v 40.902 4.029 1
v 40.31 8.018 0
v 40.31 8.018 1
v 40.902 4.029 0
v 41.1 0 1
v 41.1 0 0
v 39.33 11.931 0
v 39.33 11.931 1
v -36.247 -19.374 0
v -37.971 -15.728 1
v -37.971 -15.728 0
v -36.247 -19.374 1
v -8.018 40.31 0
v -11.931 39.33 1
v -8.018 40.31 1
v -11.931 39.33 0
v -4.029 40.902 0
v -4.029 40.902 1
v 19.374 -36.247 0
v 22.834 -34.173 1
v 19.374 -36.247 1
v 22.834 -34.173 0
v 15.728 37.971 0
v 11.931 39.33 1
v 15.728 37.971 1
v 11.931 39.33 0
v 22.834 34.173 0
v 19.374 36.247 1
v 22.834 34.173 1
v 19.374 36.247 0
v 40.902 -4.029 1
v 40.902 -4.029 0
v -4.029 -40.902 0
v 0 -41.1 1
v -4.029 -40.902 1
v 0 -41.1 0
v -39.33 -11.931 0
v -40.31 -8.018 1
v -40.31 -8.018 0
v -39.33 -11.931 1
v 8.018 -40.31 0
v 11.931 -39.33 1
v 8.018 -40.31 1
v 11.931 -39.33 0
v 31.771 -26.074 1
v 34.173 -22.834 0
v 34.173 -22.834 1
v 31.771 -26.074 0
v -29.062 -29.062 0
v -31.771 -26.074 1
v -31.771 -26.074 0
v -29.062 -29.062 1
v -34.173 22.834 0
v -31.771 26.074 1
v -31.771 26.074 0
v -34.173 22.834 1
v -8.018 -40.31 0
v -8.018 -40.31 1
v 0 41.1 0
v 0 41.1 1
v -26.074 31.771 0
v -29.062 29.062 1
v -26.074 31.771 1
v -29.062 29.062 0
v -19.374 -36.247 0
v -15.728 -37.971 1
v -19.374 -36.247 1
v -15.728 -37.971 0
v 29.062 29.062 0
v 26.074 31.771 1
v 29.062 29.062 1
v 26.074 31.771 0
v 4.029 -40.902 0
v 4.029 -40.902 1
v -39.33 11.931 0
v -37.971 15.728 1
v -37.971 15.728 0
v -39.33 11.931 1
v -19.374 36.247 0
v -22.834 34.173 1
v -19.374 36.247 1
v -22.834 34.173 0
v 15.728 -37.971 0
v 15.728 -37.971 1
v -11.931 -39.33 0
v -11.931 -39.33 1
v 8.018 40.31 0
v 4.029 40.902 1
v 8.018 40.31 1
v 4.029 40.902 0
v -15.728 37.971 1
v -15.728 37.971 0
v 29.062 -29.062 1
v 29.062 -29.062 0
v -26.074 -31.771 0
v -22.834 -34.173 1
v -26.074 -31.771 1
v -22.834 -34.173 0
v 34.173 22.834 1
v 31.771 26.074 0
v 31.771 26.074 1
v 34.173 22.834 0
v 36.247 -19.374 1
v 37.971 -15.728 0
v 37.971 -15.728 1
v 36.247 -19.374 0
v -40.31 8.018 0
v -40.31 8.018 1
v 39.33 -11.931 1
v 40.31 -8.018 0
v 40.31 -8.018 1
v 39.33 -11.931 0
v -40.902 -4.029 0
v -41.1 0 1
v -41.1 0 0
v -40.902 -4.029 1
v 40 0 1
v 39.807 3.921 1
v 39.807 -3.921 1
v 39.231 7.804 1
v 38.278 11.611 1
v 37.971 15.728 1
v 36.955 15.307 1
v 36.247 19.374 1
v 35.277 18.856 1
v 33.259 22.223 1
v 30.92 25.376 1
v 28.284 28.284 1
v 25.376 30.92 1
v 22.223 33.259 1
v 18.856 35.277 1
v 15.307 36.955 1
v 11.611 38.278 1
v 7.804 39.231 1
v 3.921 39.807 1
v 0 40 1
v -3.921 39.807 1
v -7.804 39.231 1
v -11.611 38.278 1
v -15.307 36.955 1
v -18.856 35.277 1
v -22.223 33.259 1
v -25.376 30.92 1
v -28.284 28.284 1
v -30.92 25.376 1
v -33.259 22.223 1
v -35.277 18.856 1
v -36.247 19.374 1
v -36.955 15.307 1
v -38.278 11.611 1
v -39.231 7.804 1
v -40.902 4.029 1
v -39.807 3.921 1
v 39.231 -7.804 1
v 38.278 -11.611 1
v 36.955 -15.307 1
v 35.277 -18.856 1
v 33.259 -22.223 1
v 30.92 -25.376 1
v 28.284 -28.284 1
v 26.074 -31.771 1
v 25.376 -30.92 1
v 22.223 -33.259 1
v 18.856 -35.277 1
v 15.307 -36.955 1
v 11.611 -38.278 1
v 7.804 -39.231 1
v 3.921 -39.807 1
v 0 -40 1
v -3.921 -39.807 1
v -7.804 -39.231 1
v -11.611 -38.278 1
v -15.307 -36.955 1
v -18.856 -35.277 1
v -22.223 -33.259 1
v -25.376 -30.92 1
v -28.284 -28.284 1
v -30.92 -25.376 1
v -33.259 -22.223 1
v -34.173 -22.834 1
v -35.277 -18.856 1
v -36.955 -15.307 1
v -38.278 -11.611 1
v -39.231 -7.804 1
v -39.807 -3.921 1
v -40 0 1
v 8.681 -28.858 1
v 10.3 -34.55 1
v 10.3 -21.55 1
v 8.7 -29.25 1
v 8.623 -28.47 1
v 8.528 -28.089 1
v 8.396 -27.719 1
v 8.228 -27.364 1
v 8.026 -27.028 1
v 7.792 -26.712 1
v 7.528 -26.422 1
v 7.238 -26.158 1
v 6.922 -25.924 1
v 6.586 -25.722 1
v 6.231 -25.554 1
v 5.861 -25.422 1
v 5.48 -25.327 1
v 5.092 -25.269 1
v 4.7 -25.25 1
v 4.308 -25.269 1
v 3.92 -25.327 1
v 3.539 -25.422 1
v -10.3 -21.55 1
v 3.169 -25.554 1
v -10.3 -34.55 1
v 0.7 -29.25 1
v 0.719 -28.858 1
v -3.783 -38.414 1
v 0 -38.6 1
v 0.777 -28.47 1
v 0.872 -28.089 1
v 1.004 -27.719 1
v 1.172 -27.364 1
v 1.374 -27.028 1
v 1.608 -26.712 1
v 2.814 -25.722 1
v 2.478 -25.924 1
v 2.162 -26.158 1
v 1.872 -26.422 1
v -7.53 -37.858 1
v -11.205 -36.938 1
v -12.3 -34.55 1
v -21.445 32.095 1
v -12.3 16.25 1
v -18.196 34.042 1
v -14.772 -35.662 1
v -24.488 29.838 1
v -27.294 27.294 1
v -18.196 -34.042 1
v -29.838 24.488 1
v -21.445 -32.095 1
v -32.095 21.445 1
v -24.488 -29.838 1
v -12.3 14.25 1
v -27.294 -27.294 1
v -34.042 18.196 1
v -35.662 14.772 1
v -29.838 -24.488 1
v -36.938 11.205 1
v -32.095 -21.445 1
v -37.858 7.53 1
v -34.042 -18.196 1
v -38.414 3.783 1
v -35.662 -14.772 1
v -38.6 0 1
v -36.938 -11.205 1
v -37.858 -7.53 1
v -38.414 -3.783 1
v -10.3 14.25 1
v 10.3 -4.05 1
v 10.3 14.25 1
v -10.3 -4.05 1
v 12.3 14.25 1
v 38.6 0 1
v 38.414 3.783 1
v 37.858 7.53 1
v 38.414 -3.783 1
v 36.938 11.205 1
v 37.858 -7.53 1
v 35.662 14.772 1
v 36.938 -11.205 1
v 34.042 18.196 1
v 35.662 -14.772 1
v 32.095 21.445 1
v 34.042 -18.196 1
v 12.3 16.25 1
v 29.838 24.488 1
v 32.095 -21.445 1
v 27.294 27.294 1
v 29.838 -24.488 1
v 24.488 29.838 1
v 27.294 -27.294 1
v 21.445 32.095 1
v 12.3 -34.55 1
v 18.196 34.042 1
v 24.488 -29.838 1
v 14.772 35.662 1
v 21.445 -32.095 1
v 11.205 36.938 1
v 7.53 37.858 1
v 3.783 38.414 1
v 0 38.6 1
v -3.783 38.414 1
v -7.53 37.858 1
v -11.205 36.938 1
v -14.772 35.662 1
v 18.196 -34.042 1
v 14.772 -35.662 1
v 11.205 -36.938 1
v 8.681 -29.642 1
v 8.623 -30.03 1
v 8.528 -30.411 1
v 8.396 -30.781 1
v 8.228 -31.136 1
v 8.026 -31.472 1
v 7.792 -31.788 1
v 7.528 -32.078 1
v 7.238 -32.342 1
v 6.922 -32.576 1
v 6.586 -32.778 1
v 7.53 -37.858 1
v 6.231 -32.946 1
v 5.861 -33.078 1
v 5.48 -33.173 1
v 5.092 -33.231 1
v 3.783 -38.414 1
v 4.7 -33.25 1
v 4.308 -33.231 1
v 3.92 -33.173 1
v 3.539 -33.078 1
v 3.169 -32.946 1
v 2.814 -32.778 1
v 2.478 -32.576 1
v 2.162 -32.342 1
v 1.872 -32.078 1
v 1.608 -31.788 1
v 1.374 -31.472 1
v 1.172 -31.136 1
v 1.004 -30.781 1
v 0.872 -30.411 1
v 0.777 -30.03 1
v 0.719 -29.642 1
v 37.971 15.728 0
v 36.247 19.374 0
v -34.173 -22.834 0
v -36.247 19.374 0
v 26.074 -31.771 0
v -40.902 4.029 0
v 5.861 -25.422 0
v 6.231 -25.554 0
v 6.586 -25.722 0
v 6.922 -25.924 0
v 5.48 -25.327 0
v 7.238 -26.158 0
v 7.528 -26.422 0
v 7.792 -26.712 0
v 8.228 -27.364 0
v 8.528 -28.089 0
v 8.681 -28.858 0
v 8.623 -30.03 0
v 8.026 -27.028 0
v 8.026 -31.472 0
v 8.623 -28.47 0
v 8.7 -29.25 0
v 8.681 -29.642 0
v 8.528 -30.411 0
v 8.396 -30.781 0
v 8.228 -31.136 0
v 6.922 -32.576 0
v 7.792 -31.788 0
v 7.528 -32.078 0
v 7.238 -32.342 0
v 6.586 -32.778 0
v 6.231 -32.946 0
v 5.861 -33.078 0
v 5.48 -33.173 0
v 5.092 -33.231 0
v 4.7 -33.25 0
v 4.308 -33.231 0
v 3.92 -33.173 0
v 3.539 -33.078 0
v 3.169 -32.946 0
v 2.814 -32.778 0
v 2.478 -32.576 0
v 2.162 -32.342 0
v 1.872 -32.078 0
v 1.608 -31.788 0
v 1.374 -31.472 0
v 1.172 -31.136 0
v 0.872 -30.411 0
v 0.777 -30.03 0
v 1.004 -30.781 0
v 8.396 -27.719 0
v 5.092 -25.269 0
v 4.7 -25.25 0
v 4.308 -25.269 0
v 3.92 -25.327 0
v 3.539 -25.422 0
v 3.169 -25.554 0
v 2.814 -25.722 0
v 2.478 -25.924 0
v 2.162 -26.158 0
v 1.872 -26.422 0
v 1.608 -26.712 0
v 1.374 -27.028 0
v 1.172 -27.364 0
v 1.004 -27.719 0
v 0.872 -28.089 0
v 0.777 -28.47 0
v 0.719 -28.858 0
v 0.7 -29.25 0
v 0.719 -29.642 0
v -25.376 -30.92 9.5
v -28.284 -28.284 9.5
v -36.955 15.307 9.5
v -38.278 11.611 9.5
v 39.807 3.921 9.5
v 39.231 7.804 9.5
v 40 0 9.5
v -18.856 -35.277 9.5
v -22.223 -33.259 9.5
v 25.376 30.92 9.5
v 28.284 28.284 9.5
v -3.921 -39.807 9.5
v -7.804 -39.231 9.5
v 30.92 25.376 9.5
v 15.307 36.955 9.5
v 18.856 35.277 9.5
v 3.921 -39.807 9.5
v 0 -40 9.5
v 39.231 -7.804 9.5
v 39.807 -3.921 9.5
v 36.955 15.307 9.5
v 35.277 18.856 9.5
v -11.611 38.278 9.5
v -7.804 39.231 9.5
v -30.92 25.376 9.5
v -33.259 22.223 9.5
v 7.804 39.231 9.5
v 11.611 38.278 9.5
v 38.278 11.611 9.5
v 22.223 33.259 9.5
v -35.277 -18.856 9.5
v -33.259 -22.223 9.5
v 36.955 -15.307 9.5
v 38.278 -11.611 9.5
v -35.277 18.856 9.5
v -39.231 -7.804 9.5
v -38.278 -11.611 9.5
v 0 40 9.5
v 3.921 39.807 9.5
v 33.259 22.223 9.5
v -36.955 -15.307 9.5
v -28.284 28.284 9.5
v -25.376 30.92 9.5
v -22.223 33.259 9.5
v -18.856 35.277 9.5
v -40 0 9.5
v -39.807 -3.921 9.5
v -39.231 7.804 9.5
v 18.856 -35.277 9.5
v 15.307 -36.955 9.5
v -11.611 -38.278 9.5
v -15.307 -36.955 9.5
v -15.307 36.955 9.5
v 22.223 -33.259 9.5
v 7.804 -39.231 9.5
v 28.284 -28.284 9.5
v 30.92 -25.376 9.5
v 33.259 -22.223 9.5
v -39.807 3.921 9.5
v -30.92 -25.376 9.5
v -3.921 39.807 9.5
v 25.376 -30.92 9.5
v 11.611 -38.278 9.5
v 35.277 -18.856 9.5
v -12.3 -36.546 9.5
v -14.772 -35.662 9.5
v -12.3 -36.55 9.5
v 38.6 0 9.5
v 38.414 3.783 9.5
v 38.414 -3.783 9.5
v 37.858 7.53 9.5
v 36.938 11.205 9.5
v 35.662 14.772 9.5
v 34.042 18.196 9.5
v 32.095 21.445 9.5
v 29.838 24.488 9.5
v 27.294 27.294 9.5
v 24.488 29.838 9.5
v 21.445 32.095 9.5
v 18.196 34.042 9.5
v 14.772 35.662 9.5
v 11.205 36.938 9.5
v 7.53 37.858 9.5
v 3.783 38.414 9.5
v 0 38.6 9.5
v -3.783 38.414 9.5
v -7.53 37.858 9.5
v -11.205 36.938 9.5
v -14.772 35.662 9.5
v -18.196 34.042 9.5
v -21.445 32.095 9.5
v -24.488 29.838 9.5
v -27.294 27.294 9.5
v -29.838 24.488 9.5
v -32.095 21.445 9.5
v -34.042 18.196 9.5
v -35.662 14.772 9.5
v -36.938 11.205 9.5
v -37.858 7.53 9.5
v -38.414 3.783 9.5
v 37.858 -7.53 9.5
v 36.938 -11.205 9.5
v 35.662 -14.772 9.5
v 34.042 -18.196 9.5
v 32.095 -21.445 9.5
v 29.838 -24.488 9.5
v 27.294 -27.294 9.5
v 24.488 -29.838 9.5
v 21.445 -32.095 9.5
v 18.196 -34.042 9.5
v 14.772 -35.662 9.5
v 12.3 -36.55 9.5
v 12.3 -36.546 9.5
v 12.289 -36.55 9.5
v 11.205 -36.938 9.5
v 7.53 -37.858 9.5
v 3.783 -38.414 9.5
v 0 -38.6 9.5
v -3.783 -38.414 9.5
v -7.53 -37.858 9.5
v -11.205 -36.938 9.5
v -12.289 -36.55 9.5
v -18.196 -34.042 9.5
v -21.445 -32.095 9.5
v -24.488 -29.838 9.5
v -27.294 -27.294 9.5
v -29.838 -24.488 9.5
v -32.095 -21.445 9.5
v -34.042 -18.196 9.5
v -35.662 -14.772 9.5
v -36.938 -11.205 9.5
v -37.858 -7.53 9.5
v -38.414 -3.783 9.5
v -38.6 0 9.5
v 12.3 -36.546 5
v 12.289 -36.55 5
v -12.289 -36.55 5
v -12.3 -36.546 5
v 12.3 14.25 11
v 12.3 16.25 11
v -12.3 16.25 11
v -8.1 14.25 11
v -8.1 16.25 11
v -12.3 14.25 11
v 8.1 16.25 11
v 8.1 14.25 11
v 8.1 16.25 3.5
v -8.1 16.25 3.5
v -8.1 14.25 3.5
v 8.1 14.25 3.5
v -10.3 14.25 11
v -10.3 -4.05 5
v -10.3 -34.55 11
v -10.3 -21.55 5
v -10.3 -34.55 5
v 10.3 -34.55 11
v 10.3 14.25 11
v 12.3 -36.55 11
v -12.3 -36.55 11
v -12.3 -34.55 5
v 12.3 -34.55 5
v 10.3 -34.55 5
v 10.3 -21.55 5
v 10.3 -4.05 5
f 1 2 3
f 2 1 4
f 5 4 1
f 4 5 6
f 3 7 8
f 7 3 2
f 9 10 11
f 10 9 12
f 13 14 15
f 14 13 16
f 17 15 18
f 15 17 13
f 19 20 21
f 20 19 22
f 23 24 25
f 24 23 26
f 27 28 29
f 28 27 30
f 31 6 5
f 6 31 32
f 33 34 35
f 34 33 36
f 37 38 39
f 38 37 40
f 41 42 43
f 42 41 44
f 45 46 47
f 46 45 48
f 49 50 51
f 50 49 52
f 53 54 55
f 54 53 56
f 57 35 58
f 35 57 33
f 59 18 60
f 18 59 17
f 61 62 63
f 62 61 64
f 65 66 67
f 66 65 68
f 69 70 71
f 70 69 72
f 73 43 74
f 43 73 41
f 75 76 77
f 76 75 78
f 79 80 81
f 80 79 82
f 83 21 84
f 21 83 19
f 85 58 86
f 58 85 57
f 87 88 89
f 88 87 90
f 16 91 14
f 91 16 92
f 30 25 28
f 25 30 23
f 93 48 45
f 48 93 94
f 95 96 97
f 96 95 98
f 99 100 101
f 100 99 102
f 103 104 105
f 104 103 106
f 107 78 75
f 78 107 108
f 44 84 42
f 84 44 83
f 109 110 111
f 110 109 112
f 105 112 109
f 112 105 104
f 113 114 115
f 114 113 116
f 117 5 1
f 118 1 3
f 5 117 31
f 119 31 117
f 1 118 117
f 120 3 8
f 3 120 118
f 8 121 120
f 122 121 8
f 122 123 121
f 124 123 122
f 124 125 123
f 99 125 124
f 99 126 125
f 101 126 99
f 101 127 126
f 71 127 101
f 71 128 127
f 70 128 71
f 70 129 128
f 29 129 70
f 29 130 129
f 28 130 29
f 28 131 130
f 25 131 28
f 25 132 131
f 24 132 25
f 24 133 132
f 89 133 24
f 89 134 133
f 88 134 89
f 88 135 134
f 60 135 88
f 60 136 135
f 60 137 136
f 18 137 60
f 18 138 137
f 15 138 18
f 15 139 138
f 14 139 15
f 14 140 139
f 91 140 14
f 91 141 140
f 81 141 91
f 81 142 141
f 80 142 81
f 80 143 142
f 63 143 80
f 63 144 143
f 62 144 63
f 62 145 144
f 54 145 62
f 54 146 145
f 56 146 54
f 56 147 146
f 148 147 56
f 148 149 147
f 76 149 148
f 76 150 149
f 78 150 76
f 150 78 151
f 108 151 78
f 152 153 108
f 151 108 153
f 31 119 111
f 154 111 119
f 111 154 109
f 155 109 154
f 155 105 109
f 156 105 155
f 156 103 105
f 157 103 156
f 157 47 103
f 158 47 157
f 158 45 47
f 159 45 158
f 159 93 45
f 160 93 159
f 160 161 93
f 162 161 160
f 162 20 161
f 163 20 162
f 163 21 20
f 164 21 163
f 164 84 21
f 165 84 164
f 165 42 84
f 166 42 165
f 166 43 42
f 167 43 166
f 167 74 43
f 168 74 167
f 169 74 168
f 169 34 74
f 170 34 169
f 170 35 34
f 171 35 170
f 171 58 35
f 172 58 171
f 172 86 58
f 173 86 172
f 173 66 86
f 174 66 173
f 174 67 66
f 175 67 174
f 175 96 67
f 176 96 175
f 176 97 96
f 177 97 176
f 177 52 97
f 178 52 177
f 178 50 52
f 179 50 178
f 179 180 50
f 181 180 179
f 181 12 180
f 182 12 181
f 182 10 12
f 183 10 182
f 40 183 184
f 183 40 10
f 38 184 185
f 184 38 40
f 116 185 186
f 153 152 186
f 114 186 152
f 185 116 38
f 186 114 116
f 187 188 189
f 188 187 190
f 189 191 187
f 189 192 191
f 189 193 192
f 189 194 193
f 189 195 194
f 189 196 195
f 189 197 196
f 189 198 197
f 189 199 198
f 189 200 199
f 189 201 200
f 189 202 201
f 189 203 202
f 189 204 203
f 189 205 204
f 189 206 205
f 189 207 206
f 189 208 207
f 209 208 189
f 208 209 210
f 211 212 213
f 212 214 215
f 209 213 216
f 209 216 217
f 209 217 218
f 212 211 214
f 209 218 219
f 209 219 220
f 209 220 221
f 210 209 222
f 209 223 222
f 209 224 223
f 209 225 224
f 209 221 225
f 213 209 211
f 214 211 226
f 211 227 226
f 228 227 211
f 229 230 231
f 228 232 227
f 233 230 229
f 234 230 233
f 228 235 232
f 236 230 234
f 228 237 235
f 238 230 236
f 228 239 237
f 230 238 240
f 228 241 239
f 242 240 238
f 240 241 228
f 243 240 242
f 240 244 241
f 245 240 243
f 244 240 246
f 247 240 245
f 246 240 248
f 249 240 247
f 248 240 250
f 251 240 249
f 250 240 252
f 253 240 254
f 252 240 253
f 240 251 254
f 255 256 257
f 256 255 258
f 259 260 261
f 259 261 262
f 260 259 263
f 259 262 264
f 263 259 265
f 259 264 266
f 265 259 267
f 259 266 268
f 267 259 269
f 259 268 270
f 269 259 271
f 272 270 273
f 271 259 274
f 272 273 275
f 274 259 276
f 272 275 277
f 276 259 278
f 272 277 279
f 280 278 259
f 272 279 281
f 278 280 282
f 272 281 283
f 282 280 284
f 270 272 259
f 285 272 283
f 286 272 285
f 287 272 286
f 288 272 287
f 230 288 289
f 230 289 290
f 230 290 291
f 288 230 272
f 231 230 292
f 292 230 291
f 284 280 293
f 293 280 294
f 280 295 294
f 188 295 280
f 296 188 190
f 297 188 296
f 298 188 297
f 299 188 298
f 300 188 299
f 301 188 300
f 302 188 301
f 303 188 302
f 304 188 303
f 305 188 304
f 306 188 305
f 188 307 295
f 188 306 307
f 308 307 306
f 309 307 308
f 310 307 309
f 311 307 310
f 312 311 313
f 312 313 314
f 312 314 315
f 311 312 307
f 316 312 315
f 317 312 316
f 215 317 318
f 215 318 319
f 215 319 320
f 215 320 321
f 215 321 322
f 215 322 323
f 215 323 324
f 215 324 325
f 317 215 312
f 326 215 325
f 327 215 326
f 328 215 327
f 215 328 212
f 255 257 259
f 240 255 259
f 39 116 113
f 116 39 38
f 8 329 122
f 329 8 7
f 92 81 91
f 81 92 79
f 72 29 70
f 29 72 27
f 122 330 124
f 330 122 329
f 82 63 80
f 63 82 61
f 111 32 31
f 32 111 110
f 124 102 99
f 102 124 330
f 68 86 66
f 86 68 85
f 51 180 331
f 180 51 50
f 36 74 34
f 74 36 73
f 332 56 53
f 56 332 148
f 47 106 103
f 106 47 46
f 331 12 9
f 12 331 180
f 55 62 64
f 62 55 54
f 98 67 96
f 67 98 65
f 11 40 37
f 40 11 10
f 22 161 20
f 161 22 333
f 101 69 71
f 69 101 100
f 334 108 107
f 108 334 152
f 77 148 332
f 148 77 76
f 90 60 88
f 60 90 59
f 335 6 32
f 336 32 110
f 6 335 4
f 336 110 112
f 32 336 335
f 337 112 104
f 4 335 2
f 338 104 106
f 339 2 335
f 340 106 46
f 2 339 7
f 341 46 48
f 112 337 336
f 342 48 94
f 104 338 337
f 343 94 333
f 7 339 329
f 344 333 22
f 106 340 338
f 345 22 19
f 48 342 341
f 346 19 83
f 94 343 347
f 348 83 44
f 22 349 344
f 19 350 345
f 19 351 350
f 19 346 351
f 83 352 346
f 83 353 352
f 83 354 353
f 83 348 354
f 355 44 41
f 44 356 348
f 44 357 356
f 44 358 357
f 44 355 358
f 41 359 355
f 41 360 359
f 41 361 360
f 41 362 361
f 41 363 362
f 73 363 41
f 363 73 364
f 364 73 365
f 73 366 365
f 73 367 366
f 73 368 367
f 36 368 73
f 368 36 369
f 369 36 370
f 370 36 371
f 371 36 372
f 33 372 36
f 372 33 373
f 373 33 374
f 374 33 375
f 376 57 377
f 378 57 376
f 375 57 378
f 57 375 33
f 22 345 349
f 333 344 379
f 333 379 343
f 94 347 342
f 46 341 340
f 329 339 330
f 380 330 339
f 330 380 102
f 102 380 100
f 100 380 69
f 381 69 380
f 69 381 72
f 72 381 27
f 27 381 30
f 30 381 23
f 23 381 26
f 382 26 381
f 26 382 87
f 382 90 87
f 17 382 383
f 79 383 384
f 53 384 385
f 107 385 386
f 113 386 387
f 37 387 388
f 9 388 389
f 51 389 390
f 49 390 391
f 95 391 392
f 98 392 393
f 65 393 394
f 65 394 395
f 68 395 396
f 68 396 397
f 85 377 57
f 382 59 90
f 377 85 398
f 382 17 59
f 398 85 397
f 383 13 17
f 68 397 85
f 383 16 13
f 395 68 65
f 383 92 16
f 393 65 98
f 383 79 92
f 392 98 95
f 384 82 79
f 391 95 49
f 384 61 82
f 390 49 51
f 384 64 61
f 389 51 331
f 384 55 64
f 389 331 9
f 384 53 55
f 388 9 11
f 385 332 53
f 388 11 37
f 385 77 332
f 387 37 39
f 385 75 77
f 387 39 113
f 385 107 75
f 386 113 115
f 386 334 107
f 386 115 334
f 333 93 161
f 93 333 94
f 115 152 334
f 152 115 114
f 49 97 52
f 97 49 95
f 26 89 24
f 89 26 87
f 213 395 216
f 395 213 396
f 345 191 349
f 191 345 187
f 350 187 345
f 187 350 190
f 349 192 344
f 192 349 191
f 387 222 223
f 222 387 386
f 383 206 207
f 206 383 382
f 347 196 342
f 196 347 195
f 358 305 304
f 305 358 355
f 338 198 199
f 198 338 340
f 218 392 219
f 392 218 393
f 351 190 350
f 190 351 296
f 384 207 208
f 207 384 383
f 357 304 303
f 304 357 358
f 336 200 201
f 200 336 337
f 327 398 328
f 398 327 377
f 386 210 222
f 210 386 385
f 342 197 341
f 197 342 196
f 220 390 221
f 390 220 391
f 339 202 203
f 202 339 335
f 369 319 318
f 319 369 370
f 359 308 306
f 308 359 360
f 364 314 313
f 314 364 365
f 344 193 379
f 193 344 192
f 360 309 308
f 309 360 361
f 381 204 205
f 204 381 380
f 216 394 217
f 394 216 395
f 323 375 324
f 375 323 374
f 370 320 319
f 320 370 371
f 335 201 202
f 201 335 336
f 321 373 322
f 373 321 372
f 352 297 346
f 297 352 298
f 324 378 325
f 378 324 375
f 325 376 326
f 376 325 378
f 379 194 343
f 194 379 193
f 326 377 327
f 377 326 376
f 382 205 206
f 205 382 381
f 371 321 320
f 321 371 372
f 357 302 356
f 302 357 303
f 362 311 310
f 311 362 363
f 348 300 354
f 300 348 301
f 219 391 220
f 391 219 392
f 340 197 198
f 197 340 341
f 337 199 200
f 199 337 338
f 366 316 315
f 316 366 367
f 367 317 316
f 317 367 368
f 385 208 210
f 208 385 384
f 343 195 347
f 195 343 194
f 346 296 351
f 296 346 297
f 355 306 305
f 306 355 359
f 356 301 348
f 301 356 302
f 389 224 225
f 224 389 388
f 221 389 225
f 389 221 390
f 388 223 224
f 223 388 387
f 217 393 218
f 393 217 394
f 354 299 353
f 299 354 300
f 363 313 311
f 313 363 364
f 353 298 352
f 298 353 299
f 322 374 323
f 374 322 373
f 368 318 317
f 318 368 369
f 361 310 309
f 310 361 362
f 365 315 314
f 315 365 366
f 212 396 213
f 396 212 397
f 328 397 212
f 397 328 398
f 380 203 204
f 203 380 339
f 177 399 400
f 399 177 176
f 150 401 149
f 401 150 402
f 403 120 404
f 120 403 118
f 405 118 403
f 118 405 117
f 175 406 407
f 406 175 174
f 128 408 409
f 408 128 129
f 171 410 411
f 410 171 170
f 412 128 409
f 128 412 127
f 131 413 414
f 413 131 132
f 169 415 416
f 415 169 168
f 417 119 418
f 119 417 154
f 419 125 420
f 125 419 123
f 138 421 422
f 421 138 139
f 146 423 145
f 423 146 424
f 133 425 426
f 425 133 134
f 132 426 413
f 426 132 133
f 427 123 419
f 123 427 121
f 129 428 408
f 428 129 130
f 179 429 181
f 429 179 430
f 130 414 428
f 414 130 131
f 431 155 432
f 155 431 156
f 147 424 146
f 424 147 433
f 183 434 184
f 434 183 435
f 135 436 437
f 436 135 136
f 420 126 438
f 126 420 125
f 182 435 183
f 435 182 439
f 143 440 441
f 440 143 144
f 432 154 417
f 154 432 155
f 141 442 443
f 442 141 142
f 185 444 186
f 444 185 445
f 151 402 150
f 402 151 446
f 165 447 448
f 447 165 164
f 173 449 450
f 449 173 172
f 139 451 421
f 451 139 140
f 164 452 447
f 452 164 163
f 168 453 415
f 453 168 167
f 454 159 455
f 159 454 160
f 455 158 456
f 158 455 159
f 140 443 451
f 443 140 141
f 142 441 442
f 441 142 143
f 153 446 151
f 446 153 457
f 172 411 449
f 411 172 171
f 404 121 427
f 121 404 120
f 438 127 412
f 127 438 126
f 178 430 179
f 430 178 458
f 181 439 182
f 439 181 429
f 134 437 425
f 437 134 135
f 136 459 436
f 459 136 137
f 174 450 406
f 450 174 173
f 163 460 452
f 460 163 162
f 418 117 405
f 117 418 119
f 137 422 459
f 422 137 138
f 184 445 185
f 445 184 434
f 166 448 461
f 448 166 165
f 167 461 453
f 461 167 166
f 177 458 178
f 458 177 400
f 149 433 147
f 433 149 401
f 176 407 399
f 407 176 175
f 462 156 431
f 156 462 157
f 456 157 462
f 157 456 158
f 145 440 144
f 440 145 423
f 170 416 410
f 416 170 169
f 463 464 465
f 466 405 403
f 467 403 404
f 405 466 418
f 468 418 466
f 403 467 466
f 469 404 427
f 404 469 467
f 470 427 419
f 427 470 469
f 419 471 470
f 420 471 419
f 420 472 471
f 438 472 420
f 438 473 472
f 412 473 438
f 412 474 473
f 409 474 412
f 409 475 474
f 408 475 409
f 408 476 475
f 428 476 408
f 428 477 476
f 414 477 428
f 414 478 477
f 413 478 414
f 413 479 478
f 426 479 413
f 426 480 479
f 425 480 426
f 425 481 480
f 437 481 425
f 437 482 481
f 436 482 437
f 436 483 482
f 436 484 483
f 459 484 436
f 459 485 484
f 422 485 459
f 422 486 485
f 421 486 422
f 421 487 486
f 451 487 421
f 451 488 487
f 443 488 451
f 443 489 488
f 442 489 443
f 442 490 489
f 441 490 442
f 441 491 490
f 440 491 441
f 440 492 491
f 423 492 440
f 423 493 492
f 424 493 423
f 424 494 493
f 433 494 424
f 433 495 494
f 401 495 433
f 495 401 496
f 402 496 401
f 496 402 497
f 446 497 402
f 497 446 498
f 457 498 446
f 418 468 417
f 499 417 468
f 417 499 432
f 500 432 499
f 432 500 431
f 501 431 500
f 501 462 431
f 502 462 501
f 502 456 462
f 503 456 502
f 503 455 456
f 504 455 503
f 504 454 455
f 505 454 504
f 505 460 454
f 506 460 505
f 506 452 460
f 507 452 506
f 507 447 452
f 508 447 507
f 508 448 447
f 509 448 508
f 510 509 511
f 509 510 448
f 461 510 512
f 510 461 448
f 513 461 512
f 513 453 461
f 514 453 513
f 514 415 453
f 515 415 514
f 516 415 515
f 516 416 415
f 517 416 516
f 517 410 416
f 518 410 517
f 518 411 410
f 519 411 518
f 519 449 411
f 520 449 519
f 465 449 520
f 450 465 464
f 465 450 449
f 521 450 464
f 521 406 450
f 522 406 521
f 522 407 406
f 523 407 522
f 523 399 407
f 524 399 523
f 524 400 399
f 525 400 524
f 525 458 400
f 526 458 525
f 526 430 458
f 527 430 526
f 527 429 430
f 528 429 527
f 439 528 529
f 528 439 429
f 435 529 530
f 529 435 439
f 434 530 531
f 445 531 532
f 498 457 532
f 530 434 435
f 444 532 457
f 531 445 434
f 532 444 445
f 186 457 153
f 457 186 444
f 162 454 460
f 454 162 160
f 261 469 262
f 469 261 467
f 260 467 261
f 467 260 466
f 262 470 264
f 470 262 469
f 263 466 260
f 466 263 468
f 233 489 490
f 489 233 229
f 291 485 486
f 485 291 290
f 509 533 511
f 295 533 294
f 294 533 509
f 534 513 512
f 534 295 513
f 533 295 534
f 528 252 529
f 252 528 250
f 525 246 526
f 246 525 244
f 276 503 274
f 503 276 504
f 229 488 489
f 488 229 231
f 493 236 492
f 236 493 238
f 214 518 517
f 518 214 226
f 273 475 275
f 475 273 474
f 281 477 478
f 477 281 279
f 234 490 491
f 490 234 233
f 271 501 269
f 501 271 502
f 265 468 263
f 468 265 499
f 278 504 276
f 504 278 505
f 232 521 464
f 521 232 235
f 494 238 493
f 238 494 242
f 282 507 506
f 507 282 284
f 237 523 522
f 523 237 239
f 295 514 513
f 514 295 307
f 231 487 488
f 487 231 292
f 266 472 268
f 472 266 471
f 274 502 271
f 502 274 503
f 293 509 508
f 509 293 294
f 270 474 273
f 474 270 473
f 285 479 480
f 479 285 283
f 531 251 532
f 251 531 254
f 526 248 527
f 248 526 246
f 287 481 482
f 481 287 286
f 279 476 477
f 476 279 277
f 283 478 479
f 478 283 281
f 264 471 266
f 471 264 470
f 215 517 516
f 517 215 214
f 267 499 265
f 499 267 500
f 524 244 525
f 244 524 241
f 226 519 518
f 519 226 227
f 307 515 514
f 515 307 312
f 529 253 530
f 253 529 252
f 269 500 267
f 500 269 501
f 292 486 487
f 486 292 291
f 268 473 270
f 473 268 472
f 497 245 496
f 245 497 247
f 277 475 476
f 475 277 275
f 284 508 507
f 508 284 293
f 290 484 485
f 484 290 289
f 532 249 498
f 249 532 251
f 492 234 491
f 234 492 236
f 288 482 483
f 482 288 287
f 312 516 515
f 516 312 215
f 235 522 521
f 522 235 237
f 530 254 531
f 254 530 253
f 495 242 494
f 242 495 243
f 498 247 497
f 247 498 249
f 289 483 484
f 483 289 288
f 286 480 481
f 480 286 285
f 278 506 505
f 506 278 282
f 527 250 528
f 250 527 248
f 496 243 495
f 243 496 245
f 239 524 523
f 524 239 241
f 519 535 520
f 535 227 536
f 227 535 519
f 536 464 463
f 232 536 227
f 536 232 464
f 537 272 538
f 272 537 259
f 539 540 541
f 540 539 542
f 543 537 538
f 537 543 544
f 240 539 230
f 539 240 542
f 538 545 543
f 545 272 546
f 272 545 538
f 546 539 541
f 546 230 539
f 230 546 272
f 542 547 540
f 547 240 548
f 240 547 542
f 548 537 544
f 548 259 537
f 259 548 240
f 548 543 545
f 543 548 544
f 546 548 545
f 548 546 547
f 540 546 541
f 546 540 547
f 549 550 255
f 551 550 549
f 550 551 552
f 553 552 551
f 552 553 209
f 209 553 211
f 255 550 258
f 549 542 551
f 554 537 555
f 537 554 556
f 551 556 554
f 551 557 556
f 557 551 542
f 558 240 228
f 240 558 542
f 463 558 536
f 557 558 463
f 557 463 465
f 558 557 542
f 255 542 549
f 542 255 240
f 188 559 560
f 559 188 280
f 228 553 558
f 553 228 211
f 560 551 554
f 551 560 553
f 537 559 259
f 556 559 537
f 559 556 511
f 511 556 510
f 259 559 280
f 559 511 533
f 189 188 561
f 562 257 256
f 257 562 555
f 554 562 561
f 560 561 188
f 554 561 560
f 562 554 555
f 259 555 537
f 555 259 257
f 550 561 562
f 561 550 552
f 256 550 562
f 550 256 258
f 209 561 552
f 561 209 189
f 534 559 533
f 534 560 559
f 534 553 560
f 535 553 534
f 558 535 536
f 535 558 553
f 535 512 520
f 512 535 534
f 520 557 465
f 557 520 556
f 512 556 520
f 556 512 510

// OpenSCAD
cd          = 80+0.2;
ch          = 26+8; //higher from 26, oogjes higher
ww          = 1;

lidh        = ch/4;


//visible area on screen
eyew        = 22 - 0.1; // a bit tighter
eyel        = 22 - 0.1;

eyelw       = 35 + 0.4; 
eyeww       = 28 + 0.4;

eyetopl     = 2 + 0.2;
eyebotl     = 6.4;
eyewdif     = eyeww - eyew;

esp12w      = 20.4;
esp12l      = 48.6;

//esp12 holder
sepcside    = 2;
wfudge      = 0.2;
lfudge      = 0.2;  

butxo       = 5.6;
butyo       = 5.2;

$fn=64;

//----------------------------------------------------
module lidclicks(){

cutoutw = 9;    
        translate( [0,0, lidh/2 + ww] ){
            difference(){
       //   cylinder( d=cd+ww/2, h=ww, center=true );
                union(){
                cube( [ cutoutw, cd + 1.5*ww, ww], center=true );
                cube( [ cd + 1.5*ww, cutoutw, ww], center=true );
                
                rotate( [ 0,0,45] )
                    cube( [ cd + 1.5*ww, cutoutw, ww], center=true );
                rotate( [ 0,0,-45] )
                    cube( [ cd + 1.5*ww, cutoutw, ww], center=true );
                }
                cylinder( d=cd, h=ww, center=true );

            }      
        }  
         
}

//---------------------------------------------------
module boxclicks(){

cutoutw = 10;    
    
        translate( [0,0, ch + ww - lidh/2 ] ){
//        difference(){
//          cylinder( d=cd-ww/2, h=ww, center=true );
//          cylinder( d=cd-ww, h=ww, center=true );
            
          cube( [ cutoutw, cd + 2*ww, ww], center=true );
          cube( [ cd + 2*ww, cutoutw, ww], center=true );
          rotate( [ 0,0,45] )
                cube( [ cd + ww, cutoutw, ww], center=true );
          rotate( [ 0,0,-45] )
                cube( [ cd + ww, cutoutw, ww], center=true );
            
        }  
         
}


//----------------------------------------------------
module pcbsep(){
//tolerances, creep and crimp

//height of pcbbseparation
phi     = 5*sepcside;   
//left
translate( [ -(esp12w/2) - sepcside-wfudge/2, -(esp12l+lfudge)/2, 0] )
        cube( size=[ sepcside, esp12l+lfudge, phi] );
//right
 translate( [(esp12w/2) + wfudge/2, -(esp12l+lfudge)/2, 0] )
        cube( size=[ sepcside, esp12l+lfudge, phi] );
//top    
 translate( [ -(esp12w/2) -sepcside-wfudge/2, (esp12l+lfudge)/2, 0] )
        difference(){
        cube( size=[ esp12w+ 2* sepcside + wfudge, sepcside, phi] );
            
        translate( [sepcside+2.2, 0, 2.5])
        cube( size=[ 16+wfudge, sepcside, phi-2.5] );
        }
           
//bottom    
 translate( [ -(esp12w/2) -sepcside-wfudge/2, -(esp12l+lfudge)/2 - sepcside + 15, 0] )
        cube( size=[ esp12w+ 2* sepcside + wfudge, sepcside + 30.5 -15, 4] );
 
 translate( [ -(esp12w/2) -sepcside-wfudge/2, -(esp12l+lfudge)/2 - sepcside, 4] )       
        cube( size=[ esp12w+ 2* sepcside + wfudge, sepcside, phi -4] );
}

//----------------------------------------------------
module tftholder(){
tfth = 5;

    difference(){
        cube( [ eyeww+2*ww, eyelw+2*ww,tfth ] );
        translate([ww,ww,0 ] )
            cube( [ eyeww, eyelw,tfth ] );
    }
}

//--------------------------------------------
module box(){
 screenxoff = 4;
 screenyoff = 6;//from 8
    
 difference(){
    cylinder( d=cd + 2*ww, h=ch + ww);  
    
    translate([0,0,ww])
        cylinder( d=cd, h=ch); 
   
    //left screen +2
    translate( [-eyew/2-screenxoff,-screenyoff + eyew/2,0] ){
            cylinder(d = eyew, h=ww);
    }
    //right screen
    translate( [ eyew/2+screenxoff, -screenyoff+eyew/2,0 ]){
            cylinder(d = eyew, h=ww);
    }
    //power hole
    translate([ 0,cd/2+ ww/2, (ch+2*ww)/2] )
        rotate([90,0,0])
        cylinder(d=6,h=ww);   
    
    //boxclicks();
  }        

 translate( [-eyeww -ww , -screenyoff-eyebotl,0] ) tftholder();
 translate( [ 0, -screenyoff-eyebotl,0] ) tftholder();


}   

//--------------------------------------------------------------
module lid(){

difference(){
    cylinder( d=cd + 2*ww, h=ww);  
 
    translate([ (esp12w/2)+ (wfudge/2)- butxo, -34.45+ butyo,0])       
          cylinder( d=8, h =50); 
}

 translate([0,0,ww])
 difference(){
    cylinder( d=cd-0.2, h=lidh ); 

    cylinder( d=cd-3*ww, h=lidh); 
    


 }
 
 
 
 translate( [0,-esp12l/4 +2,ww] )
    pcbsep();
 

 
 
 
}

//--------------------------------------------------------------

//translate( [ cd+4*ww, 0,0] )
//    box();

lid();
